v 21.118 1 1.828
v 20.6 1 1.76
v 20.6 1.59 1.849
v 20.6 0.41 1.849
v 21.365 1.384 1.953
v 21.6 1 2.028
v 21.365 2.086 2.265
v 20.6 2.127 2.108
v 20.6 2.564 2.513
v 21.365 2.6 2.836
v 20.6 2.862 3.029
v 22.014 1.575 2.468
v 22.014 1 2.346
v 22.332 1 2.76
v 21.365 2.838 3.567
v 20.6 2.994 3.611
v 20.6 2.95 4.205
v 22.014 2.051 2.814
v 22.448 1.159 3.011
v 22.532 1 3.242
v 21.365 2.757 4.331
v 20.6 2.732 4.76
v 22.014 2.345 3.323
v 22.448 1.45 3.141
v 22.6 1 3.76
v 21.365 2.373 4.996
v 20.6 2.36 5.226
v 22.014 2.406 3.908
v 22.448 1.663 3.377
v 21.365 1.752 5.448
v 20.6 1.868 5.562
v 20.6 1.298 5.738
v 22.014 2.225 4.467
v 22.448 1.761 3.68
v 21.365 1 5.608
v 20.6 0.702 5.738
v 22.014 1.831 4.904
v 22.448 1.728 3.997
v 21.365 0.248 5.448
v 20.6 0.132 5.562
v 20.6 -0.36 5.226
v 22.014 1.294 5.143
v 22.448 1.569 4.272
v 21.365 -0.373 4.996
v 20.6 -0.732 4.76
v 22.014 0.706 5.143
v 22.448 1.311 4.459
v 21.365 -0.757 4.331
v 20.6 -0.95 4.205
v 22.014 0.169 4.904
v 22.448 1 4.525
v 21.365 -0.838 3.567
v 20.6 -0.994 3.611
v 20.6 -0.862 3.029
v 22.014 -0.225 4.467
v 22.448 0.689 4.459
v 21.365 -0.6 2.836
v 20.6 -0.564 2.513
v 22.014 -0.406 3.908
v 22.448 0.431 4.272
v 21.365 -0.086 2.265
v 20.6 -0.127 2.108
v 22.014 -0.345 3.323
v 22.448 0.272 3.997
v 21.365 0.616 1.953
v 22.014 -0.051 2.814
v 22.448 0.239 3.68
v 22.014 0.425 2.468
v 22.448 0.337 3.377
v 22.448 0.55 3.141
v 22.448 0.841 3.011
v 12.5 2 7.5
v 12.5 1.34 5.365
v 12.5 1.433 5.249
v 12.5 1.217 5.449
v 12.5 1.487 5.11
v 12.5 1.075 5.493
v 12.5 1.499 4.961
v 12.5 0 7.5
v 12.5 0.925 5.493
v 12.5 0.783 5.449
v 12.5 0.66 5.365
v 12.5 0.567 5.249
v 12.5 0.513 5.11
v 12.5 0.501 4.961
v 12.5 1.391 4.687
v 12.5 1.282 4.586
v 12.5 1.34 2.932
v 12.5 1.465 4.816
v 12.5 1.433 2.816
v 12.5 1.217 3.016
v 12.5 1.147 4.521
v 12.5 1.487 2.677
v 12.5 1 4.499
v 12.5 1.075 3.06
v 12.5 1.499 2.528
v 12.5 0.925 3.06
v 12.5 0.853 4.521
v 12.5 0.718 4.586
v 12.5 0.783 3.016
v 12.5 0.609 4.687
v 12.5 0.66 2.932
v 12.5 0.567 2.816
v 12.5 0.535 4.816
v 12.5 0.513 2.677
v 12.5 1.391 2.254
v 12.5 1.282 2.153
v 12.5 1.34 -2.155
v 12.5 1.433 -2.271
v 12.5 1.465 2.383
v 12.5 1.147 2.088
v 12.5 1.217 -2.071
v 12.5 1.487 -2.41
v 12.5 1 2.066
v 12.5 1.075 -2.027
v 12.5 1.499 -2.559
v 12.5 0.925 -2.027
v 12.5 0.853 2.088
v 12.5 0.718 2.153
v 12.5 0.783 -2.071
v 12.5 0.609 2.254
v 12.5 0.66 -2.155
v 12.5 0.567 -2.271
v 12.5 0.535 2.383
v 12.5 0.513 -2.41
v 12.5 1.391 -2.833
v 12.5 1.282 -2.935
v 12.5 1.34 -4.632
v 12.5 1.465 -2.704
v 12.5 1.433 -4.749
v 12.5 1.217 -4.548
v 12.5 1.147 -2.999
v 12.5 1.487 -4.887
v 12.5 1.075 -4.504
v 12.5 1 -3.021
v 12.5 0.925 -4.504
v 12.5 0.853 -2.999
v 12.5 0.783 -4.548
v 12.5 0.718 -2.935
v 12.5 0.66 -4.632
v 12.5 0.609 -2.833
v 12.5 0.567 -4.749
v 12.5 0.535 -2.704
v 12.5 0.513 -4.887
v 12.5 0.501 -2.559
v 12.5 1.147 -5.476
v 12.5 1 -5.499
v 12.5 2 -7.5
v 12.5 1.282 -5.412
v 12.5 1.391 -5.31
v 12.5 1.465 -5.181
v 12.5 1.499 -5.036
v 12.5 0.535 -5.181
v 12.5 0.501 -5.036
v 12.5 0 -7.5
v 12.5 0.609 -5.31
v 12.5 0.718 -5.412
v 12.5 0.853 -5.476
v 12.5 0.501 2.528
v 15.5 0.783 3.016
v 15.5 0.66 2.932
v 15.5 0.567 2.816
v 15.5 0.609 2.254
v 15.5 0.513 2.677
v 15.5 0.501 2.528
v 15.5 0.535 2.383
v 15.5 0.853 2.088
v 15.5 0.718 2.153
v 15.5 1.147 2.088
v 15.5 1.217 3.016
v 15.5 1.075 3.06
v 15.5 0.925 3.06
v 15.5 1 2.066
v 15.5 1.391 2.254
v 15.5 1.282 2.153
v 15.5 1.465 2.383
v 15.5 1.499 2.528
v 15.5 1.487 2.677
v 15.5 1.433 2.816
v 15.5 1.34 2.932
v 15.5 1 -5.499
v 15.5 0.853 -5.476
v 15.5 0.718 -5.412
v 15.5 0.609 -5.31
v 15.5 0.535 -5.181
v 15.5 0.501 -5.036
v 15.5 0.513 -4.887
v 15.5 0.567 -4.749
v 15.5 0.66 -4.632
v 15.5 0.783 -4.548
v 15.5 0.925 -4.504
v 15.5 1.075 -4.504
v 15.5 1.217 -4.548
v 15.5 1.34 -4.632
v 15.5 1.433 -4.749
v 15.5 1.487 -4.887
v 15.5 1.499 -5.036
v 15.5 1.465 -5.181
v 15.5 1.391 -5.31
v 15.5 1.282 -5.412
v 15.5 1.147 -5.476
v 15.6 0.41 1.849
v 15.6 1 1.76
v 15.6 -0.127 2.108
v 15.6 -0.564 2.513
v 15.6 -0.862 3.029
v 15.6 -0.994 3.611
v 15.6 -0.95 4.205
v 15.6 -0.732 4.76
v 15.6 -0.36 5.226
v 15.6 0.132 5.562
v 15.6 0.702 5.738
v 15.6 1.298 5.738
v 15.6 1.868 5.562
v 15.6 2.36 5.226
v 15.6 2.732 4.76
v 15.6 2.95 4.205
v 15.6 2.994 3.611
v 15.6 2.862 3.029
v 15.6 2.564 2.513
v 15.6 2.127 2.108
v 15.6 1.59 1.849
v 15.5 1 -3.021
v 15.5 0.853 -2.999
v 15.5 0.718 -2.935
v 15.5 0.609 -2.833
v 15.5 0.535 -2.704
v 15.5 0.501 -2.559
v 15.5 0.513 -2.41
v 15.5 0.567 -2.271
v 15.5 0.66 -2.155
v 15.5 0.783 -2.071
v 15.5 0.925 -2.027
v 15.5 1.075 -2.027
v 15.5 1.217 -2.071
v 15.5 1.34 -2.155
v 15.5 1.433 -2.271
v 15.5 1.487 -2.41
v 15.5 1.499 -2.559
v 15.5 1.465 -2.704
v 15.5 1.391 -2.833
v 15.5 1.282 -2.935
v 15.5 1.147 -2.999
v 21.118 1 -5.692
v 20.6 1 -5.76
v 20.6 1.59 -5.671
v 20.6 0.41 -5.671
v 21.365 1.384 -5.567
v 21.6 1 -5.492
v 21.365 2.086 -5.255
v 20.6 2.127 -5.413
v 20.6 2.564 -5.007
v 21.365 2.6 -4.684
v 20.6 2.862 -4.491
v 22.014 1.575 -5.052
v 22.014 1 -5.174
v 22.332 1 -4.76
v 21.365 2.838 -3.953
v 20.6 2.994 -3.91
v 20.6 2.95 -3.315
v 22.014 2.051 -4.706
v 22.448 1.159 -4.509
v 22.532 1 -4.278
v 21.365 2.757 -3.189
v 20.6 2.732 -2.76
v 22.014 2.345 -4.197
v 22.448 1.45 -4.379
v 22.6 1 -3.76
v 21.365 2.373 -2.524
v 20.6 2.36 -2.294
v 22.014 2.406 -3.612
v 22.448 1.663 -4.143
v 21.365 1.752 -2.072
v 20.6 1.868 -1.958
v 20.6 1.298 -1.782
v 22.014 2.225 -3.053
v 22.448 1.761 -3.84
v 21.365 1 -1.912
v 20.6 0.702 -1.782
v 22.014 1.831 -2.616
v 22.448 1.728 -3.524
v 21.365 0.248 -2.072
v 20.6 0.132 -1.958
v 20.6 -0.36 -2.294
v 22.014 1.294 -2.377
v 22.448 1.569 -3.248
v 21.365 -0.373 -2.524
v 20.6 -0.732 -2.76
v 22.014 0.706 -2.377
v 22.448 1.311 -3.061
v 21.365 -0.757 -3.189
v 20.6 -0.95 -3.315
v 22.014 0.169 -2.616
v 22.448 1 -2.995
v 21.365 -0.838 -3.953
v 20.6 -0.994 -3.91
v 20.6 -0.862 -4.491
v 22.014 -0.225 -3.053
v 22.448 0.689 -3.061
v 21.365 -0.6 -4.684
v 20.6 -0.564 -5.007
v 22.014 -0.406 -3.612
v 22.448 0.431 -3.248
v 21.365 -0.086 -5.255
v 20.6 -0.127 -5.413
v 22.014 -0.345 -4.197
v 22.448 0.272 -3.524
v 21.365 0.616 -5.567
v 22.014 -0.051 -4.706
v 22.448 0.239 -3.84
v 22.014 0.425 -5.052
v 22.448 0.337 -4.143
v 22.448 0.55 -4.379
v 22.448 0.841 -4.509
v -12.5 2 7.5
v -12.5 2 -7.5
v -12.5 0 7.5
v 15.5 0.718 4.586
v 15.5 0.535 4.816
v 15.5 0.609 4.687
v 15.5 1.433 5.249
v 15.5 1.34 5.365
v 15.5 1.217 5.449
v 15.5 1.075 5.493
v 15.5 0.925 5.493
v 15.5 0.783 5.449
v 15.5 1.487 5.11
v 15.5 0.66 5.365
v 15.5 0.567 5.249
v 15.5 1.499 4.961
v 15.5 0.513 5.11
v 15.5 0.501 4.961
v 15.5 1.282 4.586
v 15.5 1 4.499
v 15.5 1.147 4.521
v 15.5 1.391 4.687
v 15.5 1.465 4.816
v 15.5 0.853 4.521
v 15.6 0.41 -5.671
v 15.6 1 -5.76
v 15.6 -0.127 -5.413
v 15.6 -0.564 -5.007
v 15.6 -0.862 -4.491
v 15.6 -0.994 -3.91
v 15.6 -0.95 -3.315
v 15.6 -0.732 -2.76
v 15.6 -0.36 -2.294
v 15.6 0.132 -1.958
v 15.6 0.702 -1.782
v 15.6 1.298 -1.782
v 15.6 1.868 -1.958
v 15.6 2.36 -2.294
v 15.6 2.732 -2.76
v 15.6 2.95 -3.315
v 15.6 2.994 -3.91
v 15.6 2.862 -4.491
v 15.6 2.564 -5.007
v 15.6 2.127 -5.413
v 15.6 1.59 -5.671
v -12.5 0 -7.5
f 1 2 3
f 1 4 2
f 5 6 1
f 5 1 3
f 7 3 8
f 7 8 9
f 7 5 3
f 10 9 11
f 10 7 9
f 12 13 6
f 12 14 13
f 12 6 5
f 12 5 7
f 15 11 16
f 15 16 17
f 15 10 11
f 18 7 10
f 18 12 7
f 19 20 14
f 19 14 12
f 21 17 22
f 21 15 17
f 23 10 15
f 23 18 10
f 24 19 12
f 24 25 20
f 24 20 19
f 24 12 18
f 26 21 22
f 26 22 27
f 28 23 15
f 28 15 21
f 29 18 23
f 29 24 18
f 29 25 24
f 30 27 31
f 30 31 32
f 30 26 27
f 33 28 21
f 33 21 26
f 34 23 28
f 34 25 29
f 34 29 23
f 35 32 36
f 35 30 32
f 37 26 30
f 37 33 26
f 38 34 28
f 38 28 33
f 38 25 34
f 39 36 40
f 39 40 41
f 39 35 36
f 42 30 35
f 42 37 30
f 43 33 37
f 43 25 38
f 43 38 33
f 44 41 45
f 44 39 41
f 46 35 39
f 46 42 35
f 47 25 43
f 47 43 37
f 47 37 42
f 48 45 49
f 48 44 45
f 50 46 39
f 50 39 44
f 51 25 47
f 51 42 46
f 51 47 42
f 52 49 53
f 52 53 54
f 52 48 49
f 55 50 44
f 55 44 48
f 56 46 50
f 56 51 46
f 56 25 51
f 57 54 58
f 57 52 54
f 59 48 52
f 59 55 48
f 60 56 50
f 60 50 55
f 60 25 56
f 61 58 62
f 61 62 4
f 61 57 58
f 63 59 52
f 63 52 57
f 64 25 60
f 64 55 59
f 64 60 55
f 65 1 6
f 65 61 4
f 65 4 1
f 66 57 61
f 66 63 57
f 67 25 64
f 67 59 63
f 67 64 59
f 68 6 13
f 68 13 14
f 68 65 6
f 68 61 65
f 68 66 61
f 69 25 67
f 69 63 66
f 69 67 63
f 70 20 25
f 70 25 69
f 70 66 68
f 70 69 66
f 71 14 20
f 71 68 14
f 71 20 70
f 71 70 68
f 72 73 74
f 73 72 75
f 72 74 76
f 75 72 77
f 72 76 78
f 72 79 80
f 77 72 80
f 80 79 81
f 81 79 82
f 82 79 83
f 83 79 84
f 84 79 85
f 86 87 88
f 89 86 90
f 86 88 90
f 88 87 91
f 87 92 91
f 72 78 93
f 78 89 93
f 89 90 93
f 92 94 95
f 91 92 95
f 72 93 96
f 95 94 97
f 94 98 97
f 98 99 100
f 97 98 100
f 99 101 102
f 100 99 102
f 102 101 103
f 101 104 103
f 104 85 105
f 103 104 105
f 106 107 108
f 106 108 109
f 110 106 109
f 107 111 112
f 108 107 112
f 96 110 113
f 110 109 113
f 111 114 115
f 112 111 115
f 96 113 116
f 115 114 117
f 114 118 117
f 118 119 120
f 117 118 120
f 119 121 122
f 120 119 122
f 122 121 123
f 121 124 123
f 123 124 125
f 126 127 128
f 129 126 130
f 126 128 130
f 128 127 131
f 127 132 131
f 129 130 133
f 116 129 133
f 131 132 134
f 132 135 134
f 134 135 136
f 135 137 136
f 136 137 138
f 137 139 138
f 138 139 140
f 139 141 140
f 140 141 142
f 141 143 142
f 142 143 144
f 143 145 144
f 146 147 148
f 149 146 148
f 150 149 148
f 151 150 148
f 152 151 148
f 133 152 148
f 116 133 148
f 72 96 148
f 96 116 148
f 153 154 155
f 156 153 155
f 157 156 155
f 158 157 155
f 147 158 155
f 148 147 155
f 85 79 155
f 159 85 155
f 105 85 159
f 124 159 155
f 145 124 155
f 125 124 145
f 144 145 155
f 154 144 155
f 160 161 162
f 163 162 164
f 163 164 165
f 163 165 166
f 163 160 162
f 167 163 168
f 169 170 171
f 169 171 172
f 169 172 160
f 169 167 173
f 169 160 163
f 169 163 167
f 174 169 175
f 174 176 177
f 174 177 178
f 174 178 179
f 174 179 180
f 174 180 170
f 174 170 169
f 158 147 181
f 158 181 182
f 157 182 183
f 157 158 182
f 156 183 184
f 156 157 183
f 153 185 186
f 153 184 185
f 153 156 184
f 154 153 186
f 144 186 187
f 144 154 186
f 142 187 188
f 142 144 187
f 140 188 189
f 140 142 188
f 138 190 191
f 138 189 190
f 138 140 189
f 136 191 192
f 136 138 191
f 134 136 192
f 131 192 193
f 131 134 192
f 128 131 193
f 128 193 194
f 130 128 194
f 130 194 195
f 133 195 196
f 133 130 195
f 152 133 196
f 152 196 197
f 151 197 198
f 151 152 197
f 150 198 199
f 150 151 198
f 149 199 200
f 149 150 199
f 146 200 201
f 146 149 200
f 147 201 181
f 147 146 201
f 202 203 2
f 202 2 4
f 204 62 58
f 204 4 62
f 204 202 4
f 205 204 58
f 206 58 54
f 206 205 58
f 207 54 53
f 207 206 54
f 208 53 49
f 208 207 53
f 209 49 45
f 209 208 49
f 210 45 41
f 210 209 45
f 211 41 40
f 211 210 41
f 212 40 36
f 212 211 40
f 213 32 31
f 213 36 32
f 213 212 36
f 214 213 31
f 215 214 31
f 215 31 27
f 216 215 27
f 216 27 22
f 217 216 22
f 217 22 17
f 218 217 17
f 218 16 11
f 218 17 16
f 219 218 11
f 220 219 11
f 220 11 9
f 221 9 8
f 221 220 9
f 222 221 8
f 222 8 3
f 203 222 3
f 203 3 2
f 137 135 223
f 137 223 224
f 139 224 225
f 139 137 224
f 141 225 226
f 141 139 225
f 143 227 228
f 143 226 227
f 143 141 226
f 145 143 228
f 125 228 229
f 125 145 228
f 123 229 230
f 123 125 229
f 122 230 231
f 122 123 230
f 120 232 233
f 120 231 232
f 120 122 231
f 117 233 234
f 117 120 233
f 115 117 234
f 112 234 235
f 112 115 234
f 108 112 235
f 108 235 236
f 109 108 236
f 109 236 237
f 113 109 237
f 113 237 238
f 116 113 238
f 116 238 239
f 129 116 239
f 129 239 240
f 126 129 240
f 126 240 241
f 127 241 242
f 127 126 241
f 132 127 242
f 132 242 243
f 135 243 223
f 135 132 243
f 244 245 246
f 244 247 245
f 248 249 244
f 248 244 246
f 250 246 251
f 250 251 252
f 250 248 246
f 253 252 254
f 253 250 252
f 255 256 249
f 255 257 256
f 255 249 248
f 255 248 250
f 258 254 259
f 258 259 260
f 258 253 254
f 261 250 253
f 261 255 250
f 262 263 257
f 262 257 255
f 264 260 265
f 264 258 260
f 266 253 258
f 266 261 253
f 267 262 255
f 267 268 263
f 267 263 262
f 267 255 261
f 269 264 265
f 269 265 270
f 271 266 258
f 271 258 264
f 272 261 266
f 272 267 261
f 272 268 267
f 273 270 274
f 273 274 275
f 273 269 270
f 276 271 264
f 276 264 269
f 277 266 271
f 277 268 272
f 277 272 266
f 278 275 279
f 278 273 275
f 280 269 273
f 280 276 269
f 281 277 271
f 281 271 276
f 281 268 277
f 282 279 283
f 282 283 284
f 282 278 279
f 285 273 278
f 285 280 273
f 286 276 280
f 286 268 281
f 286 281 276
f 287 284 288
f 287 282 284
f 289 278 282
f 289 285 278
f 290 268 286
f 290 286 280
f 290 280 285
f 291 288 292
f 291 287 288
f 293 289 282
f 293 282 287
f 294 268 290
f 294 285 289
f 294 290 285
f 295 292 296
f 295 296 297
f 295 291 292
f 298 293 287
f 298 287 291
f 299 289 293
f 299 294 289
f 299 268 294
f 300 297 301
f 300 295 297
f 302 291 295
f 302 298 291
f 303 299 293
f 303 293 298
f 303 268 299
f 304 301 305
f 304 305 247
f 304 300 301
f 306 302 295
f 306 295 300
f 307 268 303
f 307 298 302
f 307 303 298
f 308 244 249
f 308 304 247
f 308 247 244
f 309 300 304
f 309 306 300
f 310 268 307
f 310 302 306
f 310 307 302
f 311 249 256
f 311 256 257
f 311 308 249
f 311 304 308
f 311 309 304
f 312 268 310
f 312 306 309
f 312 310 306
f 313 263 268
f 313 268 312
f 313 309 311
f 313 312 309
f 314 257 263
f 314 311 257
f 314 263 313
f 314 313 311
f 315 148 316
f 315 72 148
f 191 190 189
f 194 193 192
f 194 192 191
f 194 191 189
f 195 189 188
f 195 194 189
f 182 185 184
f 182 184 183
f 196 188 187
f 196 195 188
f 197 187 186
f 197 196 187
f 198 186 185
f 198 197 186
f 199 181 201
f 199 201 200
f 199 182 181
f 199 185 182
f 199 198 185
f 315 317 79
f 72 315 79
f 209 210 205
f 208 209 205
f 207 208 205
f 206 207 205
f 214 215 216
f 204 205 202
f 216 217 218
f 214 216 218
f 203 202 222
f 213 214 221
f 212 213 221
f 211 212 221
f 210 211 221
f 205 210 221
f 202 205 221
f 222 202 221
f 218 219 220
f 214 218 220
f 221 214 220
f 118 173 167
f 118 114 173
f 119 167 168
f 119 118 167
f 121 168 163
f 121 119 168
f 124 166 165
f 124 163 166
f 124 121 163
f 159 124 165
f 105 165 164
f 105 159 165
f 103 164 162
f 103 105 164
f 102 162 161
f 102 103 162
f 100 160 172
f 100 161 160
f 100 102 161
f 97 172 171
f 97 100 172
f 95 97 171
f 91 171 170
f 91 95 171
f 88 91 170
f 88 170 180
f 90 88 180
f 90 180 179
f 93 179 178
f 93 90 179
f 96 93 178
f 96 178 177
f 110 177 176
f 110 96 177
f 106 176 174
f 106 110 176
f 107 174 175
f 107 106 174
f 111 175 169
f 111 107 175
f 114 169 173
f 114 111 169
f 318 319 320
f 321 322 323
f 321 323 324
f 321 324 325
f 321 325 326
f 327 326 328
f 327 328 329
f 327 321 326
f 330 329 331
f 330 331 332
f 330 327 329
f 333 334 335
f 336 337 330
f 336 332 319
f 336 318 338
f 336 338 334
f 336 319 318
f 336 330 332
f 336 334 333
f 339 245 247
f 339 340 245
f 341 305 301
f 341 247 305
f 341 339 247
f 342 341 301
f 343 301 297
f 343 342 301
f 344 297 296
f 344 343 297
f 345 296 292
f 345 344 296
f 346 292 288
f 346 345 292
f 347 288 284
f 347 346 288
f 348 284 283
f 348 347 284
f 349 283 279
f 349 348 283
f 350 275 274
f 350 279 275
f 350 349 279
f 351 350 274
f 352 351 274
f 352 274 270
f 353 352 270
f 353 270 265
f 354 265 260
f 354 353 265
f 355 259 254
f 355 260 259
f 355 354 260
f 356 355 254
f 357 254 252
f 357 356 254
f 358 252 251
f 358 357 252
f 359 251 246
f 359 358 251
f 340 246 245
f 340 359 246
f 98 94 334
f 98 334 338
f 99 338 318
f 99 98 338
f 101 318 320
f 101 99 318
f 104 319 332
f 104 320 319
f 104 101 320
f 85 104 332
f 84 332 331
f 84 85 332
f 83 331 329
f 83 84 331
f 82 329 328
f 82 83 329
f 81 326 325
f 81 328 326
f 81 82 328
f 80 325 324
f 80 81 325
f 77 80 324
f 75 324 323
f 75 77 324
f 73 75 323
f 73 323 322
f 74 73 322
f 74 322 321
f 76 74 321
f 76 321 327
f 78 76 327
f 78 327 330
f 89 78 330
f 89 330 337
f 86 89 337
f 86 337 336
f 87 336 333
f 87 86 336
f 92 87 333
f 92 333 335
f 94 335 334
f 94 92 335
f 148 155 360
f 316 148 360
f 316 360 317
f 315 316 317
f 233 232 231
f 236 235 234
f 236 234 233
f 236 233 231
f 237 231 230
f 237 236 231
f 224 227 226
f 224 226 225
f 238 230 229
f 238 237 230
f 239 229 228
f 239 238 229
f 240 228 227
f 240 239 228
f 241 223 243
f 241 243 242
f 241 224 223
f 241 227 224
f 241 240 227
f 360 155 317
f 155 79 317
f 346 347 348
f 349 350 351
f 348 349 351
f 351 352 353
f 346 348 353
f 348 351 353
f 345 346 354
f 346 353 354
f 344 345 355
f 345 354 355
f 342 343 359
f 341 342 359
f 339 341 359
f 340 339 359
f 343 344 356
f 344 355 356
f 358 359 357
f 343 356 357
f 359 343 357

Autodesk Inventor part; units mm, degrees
ref_plane "YZ Plane" through (0, 0, 0) normal (1, 0, 0) x (0, 1, 0)
ref_plane "XZ Plane" through (0, 0, 0) normal (0, 1, 0) x (-1, 0, 0)
ref_plane "XY Plane" through (0, 0, 0) normal (0, 0, 1) x (1, 0, 0)
sketch "Sketch1" plane through (0, 0, 0) normal (0, 1, 0) x (-1, 0, 0)
  line L0 (12.5, 7.5) -> (-12.5, 7.5)
  line L1 (-12.5, 7.5) -> (-12.5, -7.5)
  line L2 (-12.5, -7.5) -> (12.5, -7.5)
  line L3 (12.5, -7.5) -> (12.5, 7.5)
  line L4 (12.5, 7.5) -> (-12.5, -7.5) construction
  line L5 (-12.5, 7.5) -> (12.5, -7.5) construction
  point P0 (0, 0)
  dimension "d0" = 25
  dimension "d1" = 15
extrude "Extrusion1" add sketch "Sketch1" along normal blind 2
sketch "Sketch2" plane through (12.5, 0, 7.5) normal (1, 0, 0) x (0, 0, -1)
  circle A0 centre (2.5013, 1) radius 0.5
  circle A1 centre (4.9343, 1) radius 0.5
  circle A2 centre (10.0214, 1) radius 0.5
  circle A3 centre (12.4987, 1) radius 0.5
  point P0 (7.5, 0)
  dimension "d4" = 1
  dimension "d5" = 1
  dimension "d6" = 1
  dimension "d7" = 1
extrude "Extrusion2" add sketch "Sketch2" along normal blind 3
ref_plane "Work Plane1" through (15.6, 0, 7.5) normal (1, 0, 0) x (0, 0, -1)
sketch "Sketch4" plane through (15.6, 0, 7.5) normal (1, 0, 0) x (0, 0, -1)
  circle A0 centre (3.7399, 1) radius 2
  circle A1 centre (11.2601, 1) radius 2
  point P0 (7.5, 0)
  dimension "d11" = 4
  dimension "d12" = 4
extrude "Extrusion3" add sketch "Sketch4" along normal blind 7
sketch "Sketch5" plane through (22.6, 1, 3.7601) normal (1, 0, 0) x (0, 0, -1)
  point P0 (3.7601, -1)
fillet "Fillet1" radius 2 1 edges at (22.6, 1, 5.7601)
fillet "Fillet2" radius 2 1 edges at (22.6, 1, -1.7601)
sketch "Sketch6" plane through (0, 2, 0) normal (0, 1, 0) x (1, 0, 0)
  point P0 (0, 0)
properties part number "IR Sensor"
